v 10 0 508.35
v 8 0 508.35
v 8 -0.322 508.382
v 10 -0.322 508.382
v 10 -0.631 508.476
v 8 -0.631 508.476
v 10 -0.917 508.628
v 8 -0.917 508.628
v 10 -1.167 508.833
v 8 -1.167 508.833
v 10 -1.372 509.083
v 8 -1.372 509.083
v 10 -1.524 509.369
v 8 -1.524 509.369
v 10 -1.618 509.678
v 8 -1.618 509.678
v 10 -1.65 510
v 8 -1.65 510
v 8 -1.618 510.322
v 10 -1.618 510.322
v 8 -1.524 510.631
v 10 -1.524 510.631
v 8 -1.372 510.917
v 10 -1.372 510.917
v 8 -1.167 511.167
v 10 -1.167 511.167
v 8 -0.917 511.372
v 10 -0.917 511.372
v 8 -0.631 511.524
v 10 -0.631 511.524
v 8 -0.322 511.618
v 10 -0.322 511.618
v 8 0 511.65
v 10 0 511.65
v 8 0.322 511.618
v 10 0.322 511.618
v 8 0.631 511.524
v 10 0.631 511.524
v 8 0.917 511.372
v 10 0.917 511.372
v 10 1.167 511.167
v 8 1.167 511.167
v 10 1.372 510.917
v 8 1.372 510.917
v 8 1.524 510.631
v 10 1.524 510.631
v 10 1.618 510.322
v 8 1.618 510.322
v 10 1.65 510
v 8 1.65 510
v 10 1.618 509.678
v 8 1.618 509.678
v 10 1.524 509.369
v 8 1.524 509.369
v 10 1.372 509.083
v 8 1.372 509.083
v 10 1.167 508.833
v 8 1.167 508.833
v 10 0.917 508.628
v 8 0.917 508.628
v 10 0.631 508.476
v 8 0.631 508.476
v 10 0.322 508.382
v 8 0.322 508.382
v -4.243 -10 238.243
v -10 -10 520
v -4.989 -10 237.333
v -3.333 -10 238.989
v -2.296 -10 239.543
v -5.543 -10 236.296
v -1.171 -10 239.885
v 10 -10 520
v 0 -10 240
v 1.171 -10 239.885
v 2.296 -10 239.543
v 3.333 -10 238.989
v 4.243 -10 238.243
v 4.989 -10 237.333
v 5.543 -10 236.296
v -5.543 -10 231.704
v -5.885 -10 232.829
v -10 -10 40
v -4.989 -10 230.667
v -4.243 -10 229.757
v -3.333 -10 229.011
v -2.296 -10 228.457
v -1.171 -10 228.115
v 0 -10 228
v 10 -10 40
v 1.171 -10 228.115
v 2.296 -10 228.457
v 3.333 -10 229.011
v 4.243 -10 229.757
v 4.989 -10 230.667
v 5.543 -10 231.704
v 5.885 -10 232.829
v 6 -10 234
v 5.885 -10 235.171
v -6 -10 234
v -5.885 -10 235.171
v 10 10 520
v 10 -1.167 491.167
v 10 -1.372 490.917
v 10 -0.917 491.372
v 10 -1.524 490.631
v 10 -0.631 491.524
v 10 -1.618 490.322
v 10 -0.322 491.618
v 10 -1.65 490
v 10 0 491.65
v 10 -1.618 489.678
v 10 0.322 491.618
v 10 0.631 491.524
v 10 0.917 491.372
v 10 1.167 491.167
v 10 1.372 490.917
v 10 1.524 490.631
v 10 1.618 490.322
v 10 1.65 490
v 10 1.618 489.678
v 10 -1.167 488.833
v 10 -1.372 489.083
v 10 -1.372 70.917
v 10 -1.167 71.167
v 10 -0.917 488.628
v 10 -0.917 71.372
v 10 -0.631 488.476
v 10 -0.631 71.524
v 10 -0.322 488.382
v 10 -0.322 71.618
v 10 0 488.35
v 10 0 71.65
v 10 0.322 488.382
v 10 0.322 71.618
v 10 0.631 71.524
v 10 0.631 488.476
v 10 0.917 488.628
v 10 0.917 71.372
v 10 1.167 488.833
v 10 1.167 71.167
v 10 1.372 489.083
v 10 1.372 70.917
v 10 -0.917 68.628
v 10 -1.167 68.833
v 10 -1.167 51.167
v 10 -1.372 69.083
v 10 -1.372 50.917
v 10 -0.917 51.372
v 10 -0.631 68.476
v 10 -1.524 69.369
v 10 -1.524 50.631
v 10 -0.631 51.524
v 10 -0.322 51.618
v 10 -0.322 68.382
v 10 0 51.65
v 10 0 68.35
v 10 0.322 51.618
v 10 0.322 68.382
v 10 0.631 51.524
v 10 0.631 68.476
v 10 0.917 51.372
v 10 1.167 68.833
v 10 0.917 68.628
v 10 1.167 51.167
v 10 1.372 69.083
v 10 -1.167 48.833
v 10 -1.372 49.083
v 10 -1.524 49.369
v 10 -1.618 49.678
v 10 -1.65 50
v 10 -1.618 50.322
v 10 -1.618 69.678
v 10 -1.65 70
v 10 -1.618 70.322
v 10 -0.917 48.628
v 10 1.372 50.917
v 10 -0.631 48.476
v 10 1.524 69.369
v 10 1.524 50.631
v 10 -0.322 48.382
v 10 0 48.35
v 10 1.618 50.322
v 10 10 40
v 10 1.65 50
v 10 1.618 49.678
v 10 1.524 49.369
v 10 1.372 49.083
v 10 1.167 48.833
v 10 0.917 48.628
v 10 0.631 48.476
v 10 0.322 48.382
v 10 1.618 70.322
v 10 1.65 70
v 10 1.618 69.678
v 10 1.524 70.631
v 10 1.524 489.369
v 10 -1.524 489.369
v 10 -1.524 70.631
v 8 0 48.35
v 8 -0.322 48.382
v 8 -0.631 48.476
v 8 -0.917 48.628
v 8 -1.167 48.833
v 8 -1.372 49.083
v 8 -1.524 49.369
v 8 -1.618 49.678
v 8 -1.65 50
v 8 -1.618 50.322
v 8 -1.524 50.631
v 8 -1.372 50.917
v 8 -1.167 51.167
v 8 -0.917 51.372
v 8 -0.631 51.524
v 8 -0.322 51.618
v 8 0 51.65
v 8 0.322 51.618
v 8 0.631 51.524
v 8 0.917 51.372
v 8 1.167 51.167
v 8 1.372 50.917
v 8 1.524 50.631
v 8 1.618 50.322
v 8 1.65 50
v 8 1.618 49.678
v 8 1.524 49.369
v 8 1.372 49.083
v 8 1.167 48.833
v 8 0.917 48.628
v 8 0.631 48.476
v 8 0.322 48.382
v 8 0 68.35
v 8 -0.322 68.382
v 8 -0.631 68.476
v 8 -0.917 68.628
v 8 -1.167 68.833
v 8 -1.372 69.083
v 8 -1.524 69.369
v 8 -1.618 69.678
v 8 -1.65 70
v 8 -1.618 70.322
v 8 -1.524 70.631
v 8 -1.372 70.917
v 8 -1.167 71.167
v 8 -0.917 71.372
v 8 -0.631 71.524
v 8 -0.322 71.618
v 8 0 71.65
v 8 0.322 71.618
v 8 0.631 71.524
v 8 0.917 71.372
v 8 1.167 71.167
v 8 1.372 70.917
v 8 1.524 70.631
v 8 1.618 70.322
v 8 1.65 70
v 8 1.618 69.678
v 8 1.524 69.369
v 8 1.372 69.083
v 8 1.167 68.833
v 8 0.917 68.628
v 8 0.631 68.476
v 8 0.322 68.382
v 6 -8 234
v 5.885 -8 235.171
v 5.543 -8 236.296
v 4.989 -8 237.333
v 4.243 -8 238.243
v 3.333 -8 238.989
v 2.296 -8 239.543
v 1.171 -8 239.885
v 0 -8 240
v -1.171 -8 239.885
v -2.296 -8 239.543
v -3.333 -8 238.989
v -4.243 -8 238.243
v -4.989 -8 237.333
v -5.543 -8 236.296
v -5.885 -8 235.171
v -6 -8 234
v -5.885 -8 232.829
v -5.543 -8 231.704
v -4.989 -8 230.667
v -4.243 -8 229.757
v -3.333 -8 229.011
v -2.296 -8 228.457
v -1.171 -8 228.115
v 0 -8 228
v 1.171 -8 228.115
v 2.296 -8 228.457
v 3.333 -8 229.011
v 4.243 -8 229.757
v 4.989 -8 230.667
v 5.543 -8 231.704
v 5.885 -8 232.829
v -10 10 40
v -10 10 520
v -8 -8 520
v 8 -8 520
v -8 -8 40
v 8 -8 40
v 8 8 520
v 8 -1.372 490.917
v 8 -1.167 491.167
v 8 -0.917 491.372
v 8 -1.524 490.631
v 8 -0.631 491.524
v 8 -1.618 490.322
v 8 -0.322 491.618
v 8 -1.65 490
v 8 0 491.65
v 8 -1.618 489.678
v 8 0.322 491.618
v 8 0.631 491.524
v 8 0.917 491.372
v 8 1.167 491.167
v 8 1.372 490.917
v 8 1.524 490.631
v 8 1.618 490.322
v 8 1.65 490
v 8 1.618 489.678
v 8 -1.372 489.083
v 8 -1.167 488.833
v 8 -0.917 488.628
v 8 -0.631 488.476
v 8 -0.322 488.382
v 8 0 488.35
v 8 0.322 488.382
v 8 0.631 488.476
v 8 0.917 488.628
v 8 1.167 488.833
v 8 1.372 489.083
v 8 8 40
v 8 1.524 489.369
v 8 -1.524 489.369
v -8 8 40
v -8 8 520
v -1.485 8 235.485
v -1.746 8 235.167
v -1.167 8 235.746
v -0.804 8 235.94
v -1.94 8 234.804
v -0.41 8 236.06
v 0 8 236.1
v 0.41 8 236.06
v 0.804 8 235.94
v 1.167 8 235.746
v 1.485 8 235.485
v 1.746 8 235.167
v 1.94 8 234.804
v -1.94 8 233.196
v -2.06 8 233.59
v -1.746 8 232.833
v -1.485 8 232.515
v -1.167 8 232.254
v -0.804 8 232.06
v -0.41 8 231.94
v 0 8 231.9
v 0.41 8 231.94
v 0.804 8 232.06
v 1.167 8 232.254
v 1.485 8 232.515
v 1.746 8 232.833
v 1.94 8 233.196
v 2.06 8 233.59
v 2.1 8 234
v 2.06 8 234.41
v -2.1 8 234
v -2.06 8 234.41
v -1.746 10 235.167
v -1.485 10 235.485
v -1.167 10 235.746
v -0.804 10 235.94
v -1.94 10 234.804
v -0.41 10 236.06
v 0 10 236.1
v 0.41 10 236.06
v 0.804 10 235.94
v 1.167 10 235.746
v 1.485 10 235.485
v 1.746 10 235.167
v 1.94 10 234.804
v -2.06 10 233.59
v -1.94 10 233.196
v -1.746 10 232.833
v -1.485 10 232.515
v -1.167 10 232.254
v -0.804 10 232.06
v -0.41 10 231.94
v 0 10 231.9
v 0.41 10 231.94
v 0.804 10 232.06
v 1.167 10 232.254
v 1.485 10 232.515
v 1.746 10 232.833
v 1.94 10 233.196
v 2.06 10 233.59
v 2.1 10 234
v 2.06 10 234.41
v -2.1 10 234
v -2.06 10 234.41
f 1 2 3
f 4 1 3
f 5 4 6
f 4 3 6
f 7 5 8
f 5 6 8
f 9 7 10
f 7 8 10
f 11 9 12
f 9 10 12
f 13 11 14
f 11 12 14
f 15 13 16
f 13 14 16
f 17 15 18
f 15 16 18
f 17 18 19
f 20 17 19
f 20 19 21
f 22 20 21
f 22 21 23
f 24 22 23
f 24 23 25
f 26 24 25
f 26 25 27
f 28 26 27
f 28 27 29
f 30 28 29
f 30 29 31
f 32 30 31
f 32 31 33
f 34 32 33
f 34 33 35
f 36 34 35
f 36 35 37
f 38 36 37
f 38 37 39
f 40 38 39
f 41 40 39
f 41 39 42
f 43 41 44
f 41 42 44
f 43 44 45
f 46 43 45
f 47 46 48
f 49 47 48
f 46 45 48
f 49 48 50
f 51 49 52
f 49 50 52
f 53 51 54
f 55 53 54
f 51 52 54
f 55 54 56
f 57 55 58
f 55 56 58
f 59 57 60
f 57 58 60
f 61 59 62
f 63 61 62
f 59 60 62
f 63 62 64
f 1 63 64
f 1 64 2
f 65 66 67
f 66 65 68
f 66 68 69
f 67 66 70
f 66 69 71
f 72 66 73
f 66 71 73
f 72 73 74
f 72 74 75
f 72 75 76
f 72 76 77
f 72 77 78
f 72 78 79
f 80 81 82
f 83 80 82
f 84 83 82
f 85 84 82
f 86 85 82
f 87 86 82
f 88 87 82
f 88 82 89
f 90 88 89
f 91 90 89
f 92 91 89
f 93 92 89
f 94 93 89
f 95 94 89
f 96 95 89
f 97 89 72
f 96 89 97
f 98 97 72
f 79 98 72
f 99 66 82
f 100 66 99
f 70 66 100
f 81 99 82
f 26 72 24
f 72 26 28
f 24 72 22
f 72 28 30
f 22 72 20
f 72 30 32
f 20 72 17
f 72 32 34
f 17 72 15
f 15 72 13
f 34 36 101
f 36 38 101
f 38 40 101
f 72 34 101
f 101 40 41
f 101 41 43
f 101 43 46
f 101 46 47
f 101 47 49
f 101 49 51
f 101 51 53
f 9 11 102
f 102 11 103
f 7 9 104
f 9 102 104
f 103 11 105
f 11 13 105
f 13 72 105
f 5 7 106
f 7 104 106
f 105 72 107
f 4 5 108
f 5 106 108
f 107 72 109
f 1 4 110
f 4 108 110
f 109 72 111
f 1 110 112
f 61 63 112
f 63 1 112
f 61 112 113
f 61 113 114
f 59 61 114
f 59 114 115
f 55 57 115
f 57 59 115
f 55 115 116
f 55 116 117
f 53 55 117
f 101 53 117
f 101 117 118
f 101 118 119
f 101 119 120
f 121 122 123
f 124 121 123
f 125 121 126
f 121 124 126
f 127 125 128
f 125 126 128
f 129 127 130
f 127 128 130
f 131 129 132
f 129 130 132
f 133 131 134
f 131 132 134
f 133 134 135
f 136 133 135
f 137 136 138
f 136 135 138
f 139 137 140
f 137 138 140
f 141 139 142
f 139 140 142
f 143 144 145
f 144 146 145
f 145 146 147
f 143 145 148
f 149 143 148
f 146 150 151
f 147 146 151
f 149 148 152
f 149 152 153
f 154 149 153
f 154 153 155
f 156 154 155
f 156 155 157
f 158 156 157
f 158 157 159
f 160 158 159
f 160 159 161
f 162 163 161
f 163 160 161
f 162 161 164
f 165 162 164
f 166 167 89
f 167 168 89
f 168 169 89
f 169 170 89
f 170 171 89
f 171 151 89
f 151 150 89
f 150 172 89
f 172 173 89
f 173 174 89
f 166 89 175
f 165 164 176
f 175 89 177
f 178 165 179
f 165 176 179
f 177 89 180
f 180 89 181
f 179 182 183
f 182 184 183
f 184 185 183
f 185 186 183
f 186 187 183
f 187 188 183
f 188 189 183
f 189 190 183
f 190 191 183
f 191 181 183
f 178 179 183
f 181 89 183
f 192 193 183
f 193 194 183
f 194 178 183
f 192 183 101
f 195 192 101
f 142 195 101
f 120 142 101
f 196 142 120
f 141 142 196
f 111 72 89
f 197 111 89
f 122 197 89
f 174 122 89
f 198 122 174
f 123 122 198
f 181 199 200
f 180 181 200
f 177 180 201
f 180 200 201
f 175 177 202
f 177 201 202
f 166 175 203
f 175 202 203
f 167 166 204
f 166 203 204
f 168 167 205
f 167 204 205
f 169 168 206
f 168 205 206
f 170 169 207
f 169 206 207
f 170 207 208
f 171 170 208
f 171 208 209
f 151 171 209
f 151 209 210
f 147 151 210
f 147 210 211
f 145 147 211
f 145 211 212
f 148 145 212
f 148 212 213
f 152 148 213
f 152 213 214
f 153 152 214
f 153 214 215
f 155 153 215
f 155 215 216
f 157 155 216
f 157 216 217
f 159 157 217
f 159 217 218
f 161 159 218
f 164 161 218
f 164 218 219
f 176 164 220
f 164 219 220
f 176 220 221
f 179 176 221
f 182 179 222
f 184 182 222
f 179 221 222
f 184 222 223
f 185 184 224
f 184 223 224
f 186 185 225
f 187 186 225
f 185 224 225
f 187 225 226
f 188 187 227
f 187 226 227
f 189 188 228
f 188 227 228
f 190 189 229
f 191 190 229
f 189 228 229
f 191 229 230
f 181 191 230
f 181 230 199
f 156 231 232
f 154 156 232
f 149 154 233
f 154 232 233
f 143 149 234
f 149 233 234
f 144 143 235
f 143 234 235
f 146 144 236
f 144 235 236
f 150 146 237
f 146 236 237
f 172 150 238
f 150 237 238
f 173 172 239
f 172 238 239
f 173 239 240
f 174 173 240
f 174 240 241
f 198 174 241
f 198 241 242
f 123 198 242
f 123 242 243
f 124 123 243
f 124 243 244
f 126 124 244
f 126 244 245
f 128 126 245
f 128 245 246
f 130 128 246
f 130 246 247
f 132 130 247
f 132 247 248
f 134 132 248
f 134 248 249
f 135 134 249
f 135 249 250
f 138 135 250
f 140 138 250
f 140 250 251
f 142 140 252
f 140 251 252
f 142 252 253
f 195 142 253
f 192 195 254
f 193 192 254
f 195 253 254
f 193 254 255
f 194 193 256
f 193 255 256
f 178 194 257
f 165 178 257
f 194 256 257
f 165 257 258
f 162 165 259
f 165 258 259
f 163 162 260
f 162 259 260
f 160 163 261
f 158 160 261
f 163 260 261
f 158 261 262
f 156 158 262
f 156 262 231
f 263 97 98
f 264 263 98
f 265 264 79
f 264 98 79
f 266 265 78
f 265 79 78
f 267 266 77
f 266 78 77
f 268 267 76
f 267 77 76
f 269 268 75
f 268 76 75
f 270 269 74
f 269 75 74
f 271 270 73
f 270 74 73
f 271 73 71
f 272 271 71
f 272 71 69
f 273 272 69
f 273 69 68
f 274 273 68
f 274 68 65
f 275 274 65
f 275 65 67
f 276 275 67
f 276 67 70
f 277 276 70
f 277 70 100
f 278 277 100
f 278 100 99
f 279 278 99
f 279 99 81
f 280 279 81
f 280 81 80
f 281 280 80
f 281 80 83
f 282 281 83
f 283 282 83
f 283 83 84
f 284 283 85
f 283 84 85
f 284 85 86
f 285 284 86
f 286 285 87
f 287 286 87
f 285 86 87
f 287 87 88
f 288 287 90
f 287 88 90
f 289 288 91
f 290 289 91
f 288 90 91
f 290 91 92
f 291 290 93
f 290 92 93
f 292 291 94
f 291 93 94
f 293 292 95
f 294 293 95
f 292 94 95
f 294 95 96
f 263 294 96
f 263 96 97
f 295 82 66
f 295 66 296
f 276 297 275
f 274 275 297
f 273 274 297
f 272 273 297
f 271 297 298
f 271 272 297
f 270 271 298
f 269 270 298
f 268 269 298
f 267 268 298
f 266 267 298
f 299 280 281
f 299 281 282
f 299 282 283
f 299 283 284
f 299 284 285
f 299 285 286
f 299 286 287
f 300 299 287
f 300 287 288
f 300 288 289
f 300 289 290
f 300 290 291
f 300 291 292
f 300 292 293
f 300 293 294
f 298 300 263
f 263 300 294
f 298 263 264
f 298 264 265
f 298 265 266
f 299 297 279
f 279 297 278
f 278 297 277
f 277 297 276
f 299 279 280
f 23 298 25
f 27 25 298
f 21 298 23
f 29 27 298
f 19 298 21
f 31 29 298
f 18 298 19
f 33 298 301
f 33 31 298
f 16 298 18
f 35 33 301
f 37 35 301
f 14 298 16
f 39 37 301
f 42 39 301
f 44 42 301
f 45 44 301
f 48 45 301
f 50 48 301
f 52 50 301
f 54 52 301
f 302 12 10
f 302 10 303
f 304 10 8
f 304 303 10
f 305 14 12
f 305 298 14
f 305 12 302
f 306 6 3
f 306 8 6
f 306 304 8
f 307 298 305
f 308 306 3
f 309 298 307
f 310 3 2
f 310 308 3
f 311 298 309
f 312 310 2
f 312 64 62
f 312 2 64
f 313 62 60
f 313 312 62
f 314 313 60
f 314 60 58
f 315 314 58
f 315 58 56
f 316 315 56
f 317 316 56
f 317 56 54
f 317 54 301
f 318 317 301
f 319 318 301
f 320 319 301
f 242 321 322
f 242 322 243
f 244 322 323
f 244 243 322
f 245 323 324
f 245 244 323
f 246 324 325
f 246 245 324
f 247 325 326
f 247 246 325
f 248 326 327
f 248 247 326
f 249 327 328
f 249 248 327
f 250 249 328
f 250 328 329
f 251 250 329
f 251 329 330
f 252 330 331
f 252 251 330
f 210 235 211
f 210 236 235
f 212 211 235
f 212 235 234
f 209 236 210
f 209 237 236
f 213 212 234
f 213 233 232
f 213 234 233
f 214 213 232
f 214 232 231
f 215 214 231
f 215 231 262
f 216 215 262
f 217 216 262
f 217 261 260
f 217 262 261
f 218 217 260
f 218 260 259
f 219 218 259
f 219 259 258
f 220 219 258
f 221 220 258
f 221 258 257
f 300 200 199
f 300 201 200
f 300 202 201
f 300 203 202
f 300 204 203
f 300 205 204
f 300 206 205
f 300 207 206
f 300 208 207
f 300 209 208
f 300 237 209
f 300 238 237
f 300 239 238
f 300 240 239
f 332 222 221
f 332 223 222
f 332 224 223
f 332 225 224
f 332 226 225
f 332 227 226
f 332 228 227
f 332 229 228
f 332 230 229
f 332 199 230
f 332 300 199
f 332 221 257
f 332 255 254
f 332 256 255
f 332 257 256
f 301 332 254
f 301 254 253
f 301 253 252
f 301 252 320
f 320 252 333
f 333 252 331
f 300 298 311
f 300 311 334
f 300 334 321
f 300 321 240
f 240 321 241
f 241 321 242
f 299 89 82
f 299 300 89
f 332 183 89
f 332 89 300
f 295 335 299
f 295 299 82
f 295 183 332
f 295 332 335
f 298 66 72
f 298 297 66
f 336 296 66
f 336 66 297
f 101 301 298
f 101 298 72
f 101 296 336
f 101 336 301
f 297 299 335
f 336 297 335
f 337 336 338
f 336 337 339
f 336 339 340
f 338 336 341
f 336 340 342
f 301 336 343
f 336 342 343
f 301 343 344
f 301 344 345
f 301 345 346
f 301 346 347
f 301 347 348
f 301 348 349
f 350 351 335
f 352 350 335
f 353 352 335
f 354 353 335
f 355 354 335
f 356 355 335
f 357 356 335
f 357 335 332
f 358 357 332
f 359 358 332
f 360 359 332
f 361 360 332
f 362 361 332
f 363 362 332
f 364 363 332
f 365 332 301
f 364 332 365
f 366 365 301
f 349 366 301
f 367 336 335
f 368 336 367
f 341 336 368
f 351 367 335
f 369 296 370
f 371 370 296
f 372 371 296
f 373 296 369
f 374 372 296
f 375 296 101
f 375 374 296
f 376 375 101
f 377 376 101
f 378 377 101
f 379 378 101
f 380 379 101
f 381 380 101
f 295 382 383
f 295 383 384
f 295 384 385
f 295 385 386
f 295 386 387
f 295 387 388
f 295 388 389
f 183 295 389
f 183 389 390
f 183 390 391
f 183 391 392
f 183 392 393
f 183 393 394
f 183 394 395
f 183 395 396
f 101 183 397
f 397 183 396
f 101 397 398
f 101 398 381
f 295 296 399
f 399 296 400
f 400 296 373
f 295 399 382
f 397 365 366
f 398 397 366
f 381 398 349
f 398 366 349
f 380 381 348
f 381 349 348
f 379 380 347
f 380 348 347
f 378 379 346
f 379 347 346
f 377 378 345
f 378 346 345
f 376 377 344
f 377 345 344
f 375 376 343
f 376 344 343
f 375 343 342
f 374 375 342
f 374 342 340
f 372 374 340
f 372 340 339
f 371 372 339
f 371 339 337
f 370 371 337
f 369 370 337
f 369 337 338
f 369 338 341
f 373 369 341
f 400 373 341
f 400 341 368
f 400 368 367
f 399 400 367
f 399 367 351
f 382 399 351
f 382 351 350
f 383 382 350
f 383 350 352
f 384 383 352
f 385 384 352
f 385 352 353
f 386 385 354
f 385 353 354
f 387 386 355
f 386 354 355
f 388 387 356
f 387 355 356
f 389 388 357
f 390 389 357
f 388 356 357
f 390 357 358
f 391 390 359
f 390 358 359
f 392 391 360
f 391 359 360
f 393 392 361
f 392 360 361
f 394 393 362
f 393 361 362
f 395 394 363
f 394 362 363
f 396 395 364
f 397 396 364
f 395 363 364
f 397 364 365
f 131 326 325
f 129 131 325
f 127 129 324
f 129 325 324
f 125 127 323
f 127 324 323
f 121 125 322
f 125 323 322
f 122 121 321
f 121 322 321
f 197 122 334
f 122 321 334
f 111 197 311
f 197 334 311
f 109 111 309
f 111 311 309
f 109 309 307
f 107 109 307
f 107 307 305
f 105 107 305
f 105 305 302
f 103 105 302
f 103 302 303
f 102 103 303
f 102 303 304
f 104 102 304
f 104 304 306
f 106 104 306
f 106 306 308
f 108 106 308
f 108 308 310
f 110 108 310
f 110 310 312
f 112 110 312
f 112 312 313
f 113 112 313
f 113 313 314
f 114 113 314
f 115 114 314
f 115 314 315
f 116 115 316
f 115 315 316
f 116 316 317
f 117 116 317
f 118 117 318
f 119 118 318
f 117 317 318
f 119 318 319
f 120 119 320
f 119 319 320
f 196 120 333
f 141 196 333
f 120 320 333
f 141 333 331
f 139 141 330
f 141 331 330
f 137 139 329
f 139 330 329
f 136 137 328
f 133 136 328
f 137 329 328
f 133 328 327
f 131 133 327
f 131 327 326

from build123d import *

# Parameters (mm, degrees)
SKETCH_1_W          = 20
SKETCH_1_H          = 20
SKETCH_1_W_2        = 16
SKETCH_1_H_2        = 16
EXTRUDE_1_DEPTH     = 560
SKETCH_3_R          = 2.2
CUT_EXTRUDE_2_DEPTH = 560
SKETCH_4_R          = 2.2
CUT_EXTRUDE_3_DEPTH = 560
SKETCH_5_W          = 35.553041162
SKETCH_5_H          = 54.410354854
CUT_EXTRUDE_4_DEPTH = 40
SKETCH_6_W          = 32.938502486
SKETCH_6_H          = 36.721798984
CUT_EXTRUDE_5_DEPTH = 40
SKETCH_8_R          = 1
CUT_EXTRUDE_7_DEPTH = 10
SKETCH_10_R         = 2.1
CUT_EXTRUDE_8_DEPTH = 21
SKETCH_11_R         = 6
CUT_EXTRUDE_9_DEPTH = 10
M4X0_7_1_D          = 3.3
M4X0_7_1_DEPTH      = 11.5
M4X0_7_1_TIP        = 0.991420021


with BuildPart() as part:
    # ｽｹｯﾁ1 → ﾎﾞｽ - 押し出し1 (new body)
    with BuildSketch(Plane.XY):
        Rectangle(SKETCH_1_W, SKETCH_1_H)
        Rectangle(SKETCH_1_W_2, SKETCH_1_H_2, mode=Mode.SUBTRACT)
    extrude(amount=EXTRUDE_1_DEPTH)

    # ｽｹｯﾁ3 → ｶｯﾄ - 押し出し2 (cut)
    with BuildSketch(Plane(origin=(10, 0, 0), x_dir=(0, 0, -1), z_dir=(1, 0, 0))):
        with Locations((-530, 0)):
            Circle(SKETCH_3_R)
        with Locations((-30, 0)):
            Circle(SKETCH_3_R)
    extrude(amount=-CUT_EXTRUDE_2_DEPTH, mode=Mode.SUBTRACT)

    # ｽｹｯﾁ4 → ｶｯﾄ - 押し出し3 (cut)
    with BuildSketch(Plane(origin=(0, 10, 0), x_dir=(1, 0, 0), z_dir=(0, 1, 0))):
        with Locations((0, -550)):
            Circle(SKETCH_4_R)
        with Locations((0, -10)):
            Circle(SKETCH_4_R)
    extrude(amount=-CUT_EXTRUDE_3_DEPTH, mode=Mode.SUBTRACT)

    # ｽｹｯﾁ5 → ｶｯﾄ - 押し出し4 (cut)
    with BuildSketch(Plane(origin=(0, 0, 0), x_dir=(-1, 0, 0), z_dir=(0, 0, -1))):
        Rectangle(SKETCH_5_W, SKETCH_5_H)
    extrude(amount=-CUT_EXTRUDE_4_DEPTH, mode=Mode.SUBTRACT)

    # ｽｹｯﾁ6 → ｶｯﾄ - 押し出し5 (cut)
    with BuildSketch(Plane.XY.offset(560)):
        Rectangle(SKETCH_6_W, SKETCH_6_H)
    extrude(amount=-CUT_EXTRUDE_5_DEPTH, mode=Mode.SUBTRACT)

    # ｽｹｯﾁ8 → ｶｯﾄ - 押し出し7 (cut)
    with BuildSketch(Plane(origin=(10, 0, 0), x_dir=(0, 0, -1), z_dir=(1, 0, 0))):
        with Locations((-50, 0)):
            Circle(SKETCH_8_R)
        with Locations((-70, 0)):
            Circle(SKETCH_8_R)
        with Locations((-490, 0)):
            Circle(SKETCH_8_R)
        with Locations((-510, 0)):
            Circle(SKETCH_8_R)
    extrude(amount=-CUT_EXTRUDE_7_DEPTH, mode=Mode.SUBTRACT)

    # ｽｹｯﾁ10 → ｶｯﾄ - 押し出し8 (cut, through all)
    with BuildSketch(Plane.XZ.offset(10)):
        with Locations((0, 234)):
            Circle(SKETCH_10_R)
    extrude(amount=-CUT_EXTRUDE_8_DEPTH, mode=Mode.SUBTRACT)

    # ｽｹｯﾁ11 → ｶｯﾄ - 押し出し9 (cut)
    with BuildSketch(Plane.XZ.offset(10)):
        with Locations((0, 234)):
            Circle(SKETCH_11_R)
    extrude(amount=-CUT_EXTRUDE_9_DEPTH, mode=Mode.SUBTRACT)

    # M4x0.7 ねじ穴1
    with Locations(Plane(origin=(10, 0, 50), x_dir=(0, 0, 1), z_dir=(1, 0, 0))):
        with Locations((0, 0), (20, 0), (440, 0), (460, 0)):
            Hole(M4X0_7_1_D / 2, depth=M4X0_7_1_DEPTH)
            with Locations((0, 0, -(M4X0_7_1_DEPTH + M4X0_7_1_TIP / 2))):  # 118° drill point
                Cone(0, M4X0_7_1_D / 2, M4X0_7_1_TIP, mode=Mode.SUBTRACT)


solid = part.part
